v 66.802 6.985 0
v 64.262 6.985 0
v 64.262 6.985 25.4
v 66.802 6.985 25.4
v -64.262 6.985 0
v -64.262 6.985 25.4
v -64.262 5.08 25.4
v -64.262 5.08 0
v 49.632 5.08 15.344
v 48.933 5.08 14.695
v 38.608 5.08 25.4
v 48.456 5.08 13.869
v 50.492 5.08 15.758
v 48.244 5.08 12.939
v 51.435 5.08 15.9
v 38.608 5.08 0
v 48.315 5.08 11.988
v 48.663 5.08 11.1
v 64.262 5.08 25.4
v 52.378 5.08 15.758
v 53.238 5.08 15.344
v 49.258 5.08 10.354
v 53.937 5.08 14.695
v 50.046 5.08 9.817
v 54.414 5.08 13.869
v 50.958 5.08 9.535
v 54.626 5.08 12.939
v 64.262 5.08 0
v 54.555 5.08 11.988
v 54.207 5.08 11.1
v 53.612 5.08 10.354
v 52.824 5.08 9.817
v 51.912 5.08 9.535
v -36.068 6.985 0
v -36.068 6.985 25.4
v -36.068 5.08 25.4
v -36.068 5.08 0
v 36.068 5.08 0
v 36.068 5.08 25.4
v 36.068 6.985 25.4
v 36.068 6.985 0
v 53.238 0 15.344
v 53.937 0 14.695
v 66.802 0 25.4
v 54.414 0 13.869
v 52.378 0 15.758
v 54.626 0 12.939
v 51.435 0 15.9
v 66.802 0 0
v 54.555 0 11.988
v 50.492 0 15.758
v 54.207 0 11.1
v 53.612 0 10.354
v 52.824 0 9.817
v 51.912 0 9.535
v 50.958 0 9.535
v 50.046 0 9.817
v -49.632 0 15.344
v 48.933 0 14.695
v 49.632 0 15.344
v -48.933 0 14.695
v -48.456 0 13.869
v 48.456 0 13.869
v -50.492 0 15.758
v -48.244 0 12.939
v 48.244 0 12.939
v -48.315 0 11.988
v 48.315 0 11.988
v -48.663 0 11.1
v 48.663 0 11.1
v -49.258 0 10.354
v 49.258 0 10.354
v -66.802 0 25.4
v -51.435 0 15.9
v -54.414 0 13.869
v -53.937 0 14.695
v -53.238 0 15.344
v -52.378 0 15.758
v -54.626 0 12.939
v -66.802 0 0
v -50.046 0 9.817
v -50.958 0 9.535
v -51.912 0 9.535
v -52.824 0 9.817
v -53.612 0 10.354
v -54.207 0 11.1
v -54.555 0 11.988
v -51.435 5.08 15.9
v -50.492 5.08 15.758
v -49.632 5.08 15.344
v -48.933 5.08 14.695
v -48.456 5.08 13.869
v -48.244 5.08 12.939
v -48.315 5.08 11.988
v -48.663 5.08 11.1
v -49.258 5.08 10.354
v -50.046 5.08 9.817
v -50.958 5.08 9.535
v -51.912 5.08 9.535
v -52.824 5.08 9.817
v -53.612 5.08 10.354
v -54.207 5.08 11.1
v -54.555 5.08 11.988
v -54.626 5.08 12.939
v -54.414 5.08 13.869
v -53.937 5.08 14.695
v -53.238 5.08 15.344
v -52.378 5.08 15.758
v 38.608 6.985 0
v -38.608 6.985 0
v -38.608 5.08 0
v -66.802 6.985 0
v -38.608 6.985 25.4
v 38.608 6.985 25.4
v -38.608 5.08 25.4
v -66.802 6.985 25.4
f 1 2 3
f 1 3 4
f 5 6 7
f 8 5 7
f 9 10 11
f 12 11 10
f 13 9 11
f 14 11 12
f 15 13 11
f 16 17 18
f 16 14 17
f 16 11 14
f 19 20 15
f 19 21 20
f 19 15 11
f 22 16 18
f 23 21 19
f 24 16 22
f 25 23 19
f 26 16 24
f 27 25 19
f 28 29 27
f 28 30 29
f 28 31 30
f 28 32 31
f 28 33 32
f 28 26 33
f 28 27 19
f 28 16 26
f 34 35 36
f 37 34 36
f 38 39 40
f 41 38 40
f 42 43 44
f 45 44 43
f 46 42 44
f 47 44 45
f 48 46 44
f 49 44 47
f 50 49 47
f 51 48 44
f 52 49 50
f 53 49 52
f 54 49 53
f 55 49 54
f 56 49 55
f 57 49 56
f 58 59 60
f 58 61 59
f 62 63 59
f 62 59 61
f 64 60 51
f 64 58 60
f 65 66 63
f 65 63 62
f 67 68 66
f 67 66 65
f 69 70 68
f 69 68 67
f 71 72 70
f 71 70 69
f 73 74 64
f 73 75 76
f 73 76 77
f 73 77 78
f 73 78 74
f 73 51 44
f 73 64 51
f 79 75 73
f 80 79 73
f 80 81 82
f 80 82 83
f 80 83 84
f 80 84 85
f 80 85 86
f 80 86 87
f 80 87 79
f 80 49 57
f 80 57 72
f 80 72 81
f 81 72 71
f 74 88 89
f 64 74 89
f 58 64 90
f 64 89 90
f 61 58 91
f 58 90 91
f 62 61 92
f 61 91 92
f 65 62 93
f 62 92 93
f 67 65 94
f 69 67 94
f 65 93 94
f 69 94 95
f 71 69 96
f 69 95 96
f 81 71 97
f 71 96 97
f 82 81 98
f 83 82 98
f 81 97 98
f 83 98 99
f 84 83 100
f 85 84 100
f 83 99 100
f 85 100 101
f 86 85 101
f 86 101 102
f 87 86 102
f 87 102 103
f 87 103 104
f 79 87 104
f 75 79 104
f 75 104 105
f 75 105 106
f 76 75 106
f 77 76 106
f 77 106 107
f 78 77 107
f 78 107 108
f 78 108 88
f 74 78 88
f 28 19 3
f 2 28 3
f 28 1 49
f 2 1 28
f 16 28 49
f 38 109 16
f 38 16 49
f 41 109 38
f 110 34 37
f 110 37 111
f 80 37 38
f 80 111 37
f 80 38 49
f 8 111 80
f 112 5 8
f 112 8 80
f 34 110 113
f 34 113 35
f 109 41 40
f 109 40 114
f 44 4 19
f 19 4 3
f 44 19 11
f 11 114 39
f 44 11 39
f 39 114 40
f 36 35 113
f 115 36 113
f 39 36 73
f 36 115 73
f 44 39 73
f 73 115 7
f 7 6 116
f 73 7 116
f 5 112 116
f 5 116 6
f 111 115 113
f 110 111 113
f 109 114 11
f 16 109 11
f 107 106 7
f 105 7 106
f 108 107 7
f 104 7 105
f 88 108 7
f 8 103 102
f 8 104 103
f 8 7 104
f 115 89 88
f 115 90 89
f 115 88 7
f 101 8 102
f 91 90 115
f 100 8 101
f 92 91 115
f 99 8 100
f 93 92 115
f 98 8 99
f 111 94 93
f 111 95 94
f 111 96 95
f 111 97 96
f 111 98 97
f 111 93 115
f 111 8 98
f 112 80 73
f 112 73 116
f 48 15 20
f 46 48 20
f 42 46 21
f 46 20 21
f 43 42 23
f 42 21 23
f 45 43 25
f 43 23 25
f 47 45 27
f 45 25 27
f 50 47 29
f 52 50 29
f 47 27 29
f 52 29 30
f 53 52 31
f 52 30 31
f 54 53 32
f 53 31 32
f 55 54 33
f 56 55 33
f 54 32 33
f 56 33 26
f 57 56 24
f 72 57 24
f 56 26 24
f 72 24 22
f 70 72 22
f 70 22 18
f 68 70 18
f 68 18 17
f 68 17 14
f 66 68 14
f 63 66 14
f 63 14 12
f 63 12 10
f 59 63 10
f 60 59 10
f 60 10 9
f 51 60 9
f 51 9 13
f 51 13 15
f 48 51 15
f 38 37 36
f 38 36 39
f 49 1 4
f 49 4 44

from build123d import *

# Parameters (mm, degrees)
BOSS_EXTRUDE1_DEPTH = 25.4
SKETCH3_R           = 3.2004
CUT_EXTRUDE1_DEPTH  = 25.4


with BuildPart() as part:
    # Sketch2 → Boss-Extrude1 (new body)
    with BuildSketch(Plane.XY):
        Polygon((66.802, 0), (-66.802, 0), (-66.802, 6.985), (-64.262, 6.985), (-64.262, 5.08), (-38.608, 5.08), (-38.608, 6.985), (-36.068, 6.985), (-36.068, 5.08), (36.068, 5.08), (36.068, 6.985), (38.608, 6.985), (38.608, 5.08), (64.262, 5.08), (64.262, 6.985), (66.802, 6.985), align=None)
    extrude(amount=BOSS_EXTRUDE1_DEPTH)

    # Sketch3 → Cut-Extrude1 (cut)
    with BuildSketch(Plane(origin=(0, 5.08, 0), x_dir=(1, 0, 0), z_dir=(0, 1, 0))):
        with Locations(Location((-51.435, -12.7, 0), (0, 0, 270))):
            Circle(SKETCH3_R)
        with Locations(Location((51.435, -12.7, 0), (0, 0, 270))):
            Circle(SKETCH3_R)
    extrude(amount=-CUT_EXTRUDE1_DEPTH, mode=Mode.SUBTRACT)


solid = part.part
